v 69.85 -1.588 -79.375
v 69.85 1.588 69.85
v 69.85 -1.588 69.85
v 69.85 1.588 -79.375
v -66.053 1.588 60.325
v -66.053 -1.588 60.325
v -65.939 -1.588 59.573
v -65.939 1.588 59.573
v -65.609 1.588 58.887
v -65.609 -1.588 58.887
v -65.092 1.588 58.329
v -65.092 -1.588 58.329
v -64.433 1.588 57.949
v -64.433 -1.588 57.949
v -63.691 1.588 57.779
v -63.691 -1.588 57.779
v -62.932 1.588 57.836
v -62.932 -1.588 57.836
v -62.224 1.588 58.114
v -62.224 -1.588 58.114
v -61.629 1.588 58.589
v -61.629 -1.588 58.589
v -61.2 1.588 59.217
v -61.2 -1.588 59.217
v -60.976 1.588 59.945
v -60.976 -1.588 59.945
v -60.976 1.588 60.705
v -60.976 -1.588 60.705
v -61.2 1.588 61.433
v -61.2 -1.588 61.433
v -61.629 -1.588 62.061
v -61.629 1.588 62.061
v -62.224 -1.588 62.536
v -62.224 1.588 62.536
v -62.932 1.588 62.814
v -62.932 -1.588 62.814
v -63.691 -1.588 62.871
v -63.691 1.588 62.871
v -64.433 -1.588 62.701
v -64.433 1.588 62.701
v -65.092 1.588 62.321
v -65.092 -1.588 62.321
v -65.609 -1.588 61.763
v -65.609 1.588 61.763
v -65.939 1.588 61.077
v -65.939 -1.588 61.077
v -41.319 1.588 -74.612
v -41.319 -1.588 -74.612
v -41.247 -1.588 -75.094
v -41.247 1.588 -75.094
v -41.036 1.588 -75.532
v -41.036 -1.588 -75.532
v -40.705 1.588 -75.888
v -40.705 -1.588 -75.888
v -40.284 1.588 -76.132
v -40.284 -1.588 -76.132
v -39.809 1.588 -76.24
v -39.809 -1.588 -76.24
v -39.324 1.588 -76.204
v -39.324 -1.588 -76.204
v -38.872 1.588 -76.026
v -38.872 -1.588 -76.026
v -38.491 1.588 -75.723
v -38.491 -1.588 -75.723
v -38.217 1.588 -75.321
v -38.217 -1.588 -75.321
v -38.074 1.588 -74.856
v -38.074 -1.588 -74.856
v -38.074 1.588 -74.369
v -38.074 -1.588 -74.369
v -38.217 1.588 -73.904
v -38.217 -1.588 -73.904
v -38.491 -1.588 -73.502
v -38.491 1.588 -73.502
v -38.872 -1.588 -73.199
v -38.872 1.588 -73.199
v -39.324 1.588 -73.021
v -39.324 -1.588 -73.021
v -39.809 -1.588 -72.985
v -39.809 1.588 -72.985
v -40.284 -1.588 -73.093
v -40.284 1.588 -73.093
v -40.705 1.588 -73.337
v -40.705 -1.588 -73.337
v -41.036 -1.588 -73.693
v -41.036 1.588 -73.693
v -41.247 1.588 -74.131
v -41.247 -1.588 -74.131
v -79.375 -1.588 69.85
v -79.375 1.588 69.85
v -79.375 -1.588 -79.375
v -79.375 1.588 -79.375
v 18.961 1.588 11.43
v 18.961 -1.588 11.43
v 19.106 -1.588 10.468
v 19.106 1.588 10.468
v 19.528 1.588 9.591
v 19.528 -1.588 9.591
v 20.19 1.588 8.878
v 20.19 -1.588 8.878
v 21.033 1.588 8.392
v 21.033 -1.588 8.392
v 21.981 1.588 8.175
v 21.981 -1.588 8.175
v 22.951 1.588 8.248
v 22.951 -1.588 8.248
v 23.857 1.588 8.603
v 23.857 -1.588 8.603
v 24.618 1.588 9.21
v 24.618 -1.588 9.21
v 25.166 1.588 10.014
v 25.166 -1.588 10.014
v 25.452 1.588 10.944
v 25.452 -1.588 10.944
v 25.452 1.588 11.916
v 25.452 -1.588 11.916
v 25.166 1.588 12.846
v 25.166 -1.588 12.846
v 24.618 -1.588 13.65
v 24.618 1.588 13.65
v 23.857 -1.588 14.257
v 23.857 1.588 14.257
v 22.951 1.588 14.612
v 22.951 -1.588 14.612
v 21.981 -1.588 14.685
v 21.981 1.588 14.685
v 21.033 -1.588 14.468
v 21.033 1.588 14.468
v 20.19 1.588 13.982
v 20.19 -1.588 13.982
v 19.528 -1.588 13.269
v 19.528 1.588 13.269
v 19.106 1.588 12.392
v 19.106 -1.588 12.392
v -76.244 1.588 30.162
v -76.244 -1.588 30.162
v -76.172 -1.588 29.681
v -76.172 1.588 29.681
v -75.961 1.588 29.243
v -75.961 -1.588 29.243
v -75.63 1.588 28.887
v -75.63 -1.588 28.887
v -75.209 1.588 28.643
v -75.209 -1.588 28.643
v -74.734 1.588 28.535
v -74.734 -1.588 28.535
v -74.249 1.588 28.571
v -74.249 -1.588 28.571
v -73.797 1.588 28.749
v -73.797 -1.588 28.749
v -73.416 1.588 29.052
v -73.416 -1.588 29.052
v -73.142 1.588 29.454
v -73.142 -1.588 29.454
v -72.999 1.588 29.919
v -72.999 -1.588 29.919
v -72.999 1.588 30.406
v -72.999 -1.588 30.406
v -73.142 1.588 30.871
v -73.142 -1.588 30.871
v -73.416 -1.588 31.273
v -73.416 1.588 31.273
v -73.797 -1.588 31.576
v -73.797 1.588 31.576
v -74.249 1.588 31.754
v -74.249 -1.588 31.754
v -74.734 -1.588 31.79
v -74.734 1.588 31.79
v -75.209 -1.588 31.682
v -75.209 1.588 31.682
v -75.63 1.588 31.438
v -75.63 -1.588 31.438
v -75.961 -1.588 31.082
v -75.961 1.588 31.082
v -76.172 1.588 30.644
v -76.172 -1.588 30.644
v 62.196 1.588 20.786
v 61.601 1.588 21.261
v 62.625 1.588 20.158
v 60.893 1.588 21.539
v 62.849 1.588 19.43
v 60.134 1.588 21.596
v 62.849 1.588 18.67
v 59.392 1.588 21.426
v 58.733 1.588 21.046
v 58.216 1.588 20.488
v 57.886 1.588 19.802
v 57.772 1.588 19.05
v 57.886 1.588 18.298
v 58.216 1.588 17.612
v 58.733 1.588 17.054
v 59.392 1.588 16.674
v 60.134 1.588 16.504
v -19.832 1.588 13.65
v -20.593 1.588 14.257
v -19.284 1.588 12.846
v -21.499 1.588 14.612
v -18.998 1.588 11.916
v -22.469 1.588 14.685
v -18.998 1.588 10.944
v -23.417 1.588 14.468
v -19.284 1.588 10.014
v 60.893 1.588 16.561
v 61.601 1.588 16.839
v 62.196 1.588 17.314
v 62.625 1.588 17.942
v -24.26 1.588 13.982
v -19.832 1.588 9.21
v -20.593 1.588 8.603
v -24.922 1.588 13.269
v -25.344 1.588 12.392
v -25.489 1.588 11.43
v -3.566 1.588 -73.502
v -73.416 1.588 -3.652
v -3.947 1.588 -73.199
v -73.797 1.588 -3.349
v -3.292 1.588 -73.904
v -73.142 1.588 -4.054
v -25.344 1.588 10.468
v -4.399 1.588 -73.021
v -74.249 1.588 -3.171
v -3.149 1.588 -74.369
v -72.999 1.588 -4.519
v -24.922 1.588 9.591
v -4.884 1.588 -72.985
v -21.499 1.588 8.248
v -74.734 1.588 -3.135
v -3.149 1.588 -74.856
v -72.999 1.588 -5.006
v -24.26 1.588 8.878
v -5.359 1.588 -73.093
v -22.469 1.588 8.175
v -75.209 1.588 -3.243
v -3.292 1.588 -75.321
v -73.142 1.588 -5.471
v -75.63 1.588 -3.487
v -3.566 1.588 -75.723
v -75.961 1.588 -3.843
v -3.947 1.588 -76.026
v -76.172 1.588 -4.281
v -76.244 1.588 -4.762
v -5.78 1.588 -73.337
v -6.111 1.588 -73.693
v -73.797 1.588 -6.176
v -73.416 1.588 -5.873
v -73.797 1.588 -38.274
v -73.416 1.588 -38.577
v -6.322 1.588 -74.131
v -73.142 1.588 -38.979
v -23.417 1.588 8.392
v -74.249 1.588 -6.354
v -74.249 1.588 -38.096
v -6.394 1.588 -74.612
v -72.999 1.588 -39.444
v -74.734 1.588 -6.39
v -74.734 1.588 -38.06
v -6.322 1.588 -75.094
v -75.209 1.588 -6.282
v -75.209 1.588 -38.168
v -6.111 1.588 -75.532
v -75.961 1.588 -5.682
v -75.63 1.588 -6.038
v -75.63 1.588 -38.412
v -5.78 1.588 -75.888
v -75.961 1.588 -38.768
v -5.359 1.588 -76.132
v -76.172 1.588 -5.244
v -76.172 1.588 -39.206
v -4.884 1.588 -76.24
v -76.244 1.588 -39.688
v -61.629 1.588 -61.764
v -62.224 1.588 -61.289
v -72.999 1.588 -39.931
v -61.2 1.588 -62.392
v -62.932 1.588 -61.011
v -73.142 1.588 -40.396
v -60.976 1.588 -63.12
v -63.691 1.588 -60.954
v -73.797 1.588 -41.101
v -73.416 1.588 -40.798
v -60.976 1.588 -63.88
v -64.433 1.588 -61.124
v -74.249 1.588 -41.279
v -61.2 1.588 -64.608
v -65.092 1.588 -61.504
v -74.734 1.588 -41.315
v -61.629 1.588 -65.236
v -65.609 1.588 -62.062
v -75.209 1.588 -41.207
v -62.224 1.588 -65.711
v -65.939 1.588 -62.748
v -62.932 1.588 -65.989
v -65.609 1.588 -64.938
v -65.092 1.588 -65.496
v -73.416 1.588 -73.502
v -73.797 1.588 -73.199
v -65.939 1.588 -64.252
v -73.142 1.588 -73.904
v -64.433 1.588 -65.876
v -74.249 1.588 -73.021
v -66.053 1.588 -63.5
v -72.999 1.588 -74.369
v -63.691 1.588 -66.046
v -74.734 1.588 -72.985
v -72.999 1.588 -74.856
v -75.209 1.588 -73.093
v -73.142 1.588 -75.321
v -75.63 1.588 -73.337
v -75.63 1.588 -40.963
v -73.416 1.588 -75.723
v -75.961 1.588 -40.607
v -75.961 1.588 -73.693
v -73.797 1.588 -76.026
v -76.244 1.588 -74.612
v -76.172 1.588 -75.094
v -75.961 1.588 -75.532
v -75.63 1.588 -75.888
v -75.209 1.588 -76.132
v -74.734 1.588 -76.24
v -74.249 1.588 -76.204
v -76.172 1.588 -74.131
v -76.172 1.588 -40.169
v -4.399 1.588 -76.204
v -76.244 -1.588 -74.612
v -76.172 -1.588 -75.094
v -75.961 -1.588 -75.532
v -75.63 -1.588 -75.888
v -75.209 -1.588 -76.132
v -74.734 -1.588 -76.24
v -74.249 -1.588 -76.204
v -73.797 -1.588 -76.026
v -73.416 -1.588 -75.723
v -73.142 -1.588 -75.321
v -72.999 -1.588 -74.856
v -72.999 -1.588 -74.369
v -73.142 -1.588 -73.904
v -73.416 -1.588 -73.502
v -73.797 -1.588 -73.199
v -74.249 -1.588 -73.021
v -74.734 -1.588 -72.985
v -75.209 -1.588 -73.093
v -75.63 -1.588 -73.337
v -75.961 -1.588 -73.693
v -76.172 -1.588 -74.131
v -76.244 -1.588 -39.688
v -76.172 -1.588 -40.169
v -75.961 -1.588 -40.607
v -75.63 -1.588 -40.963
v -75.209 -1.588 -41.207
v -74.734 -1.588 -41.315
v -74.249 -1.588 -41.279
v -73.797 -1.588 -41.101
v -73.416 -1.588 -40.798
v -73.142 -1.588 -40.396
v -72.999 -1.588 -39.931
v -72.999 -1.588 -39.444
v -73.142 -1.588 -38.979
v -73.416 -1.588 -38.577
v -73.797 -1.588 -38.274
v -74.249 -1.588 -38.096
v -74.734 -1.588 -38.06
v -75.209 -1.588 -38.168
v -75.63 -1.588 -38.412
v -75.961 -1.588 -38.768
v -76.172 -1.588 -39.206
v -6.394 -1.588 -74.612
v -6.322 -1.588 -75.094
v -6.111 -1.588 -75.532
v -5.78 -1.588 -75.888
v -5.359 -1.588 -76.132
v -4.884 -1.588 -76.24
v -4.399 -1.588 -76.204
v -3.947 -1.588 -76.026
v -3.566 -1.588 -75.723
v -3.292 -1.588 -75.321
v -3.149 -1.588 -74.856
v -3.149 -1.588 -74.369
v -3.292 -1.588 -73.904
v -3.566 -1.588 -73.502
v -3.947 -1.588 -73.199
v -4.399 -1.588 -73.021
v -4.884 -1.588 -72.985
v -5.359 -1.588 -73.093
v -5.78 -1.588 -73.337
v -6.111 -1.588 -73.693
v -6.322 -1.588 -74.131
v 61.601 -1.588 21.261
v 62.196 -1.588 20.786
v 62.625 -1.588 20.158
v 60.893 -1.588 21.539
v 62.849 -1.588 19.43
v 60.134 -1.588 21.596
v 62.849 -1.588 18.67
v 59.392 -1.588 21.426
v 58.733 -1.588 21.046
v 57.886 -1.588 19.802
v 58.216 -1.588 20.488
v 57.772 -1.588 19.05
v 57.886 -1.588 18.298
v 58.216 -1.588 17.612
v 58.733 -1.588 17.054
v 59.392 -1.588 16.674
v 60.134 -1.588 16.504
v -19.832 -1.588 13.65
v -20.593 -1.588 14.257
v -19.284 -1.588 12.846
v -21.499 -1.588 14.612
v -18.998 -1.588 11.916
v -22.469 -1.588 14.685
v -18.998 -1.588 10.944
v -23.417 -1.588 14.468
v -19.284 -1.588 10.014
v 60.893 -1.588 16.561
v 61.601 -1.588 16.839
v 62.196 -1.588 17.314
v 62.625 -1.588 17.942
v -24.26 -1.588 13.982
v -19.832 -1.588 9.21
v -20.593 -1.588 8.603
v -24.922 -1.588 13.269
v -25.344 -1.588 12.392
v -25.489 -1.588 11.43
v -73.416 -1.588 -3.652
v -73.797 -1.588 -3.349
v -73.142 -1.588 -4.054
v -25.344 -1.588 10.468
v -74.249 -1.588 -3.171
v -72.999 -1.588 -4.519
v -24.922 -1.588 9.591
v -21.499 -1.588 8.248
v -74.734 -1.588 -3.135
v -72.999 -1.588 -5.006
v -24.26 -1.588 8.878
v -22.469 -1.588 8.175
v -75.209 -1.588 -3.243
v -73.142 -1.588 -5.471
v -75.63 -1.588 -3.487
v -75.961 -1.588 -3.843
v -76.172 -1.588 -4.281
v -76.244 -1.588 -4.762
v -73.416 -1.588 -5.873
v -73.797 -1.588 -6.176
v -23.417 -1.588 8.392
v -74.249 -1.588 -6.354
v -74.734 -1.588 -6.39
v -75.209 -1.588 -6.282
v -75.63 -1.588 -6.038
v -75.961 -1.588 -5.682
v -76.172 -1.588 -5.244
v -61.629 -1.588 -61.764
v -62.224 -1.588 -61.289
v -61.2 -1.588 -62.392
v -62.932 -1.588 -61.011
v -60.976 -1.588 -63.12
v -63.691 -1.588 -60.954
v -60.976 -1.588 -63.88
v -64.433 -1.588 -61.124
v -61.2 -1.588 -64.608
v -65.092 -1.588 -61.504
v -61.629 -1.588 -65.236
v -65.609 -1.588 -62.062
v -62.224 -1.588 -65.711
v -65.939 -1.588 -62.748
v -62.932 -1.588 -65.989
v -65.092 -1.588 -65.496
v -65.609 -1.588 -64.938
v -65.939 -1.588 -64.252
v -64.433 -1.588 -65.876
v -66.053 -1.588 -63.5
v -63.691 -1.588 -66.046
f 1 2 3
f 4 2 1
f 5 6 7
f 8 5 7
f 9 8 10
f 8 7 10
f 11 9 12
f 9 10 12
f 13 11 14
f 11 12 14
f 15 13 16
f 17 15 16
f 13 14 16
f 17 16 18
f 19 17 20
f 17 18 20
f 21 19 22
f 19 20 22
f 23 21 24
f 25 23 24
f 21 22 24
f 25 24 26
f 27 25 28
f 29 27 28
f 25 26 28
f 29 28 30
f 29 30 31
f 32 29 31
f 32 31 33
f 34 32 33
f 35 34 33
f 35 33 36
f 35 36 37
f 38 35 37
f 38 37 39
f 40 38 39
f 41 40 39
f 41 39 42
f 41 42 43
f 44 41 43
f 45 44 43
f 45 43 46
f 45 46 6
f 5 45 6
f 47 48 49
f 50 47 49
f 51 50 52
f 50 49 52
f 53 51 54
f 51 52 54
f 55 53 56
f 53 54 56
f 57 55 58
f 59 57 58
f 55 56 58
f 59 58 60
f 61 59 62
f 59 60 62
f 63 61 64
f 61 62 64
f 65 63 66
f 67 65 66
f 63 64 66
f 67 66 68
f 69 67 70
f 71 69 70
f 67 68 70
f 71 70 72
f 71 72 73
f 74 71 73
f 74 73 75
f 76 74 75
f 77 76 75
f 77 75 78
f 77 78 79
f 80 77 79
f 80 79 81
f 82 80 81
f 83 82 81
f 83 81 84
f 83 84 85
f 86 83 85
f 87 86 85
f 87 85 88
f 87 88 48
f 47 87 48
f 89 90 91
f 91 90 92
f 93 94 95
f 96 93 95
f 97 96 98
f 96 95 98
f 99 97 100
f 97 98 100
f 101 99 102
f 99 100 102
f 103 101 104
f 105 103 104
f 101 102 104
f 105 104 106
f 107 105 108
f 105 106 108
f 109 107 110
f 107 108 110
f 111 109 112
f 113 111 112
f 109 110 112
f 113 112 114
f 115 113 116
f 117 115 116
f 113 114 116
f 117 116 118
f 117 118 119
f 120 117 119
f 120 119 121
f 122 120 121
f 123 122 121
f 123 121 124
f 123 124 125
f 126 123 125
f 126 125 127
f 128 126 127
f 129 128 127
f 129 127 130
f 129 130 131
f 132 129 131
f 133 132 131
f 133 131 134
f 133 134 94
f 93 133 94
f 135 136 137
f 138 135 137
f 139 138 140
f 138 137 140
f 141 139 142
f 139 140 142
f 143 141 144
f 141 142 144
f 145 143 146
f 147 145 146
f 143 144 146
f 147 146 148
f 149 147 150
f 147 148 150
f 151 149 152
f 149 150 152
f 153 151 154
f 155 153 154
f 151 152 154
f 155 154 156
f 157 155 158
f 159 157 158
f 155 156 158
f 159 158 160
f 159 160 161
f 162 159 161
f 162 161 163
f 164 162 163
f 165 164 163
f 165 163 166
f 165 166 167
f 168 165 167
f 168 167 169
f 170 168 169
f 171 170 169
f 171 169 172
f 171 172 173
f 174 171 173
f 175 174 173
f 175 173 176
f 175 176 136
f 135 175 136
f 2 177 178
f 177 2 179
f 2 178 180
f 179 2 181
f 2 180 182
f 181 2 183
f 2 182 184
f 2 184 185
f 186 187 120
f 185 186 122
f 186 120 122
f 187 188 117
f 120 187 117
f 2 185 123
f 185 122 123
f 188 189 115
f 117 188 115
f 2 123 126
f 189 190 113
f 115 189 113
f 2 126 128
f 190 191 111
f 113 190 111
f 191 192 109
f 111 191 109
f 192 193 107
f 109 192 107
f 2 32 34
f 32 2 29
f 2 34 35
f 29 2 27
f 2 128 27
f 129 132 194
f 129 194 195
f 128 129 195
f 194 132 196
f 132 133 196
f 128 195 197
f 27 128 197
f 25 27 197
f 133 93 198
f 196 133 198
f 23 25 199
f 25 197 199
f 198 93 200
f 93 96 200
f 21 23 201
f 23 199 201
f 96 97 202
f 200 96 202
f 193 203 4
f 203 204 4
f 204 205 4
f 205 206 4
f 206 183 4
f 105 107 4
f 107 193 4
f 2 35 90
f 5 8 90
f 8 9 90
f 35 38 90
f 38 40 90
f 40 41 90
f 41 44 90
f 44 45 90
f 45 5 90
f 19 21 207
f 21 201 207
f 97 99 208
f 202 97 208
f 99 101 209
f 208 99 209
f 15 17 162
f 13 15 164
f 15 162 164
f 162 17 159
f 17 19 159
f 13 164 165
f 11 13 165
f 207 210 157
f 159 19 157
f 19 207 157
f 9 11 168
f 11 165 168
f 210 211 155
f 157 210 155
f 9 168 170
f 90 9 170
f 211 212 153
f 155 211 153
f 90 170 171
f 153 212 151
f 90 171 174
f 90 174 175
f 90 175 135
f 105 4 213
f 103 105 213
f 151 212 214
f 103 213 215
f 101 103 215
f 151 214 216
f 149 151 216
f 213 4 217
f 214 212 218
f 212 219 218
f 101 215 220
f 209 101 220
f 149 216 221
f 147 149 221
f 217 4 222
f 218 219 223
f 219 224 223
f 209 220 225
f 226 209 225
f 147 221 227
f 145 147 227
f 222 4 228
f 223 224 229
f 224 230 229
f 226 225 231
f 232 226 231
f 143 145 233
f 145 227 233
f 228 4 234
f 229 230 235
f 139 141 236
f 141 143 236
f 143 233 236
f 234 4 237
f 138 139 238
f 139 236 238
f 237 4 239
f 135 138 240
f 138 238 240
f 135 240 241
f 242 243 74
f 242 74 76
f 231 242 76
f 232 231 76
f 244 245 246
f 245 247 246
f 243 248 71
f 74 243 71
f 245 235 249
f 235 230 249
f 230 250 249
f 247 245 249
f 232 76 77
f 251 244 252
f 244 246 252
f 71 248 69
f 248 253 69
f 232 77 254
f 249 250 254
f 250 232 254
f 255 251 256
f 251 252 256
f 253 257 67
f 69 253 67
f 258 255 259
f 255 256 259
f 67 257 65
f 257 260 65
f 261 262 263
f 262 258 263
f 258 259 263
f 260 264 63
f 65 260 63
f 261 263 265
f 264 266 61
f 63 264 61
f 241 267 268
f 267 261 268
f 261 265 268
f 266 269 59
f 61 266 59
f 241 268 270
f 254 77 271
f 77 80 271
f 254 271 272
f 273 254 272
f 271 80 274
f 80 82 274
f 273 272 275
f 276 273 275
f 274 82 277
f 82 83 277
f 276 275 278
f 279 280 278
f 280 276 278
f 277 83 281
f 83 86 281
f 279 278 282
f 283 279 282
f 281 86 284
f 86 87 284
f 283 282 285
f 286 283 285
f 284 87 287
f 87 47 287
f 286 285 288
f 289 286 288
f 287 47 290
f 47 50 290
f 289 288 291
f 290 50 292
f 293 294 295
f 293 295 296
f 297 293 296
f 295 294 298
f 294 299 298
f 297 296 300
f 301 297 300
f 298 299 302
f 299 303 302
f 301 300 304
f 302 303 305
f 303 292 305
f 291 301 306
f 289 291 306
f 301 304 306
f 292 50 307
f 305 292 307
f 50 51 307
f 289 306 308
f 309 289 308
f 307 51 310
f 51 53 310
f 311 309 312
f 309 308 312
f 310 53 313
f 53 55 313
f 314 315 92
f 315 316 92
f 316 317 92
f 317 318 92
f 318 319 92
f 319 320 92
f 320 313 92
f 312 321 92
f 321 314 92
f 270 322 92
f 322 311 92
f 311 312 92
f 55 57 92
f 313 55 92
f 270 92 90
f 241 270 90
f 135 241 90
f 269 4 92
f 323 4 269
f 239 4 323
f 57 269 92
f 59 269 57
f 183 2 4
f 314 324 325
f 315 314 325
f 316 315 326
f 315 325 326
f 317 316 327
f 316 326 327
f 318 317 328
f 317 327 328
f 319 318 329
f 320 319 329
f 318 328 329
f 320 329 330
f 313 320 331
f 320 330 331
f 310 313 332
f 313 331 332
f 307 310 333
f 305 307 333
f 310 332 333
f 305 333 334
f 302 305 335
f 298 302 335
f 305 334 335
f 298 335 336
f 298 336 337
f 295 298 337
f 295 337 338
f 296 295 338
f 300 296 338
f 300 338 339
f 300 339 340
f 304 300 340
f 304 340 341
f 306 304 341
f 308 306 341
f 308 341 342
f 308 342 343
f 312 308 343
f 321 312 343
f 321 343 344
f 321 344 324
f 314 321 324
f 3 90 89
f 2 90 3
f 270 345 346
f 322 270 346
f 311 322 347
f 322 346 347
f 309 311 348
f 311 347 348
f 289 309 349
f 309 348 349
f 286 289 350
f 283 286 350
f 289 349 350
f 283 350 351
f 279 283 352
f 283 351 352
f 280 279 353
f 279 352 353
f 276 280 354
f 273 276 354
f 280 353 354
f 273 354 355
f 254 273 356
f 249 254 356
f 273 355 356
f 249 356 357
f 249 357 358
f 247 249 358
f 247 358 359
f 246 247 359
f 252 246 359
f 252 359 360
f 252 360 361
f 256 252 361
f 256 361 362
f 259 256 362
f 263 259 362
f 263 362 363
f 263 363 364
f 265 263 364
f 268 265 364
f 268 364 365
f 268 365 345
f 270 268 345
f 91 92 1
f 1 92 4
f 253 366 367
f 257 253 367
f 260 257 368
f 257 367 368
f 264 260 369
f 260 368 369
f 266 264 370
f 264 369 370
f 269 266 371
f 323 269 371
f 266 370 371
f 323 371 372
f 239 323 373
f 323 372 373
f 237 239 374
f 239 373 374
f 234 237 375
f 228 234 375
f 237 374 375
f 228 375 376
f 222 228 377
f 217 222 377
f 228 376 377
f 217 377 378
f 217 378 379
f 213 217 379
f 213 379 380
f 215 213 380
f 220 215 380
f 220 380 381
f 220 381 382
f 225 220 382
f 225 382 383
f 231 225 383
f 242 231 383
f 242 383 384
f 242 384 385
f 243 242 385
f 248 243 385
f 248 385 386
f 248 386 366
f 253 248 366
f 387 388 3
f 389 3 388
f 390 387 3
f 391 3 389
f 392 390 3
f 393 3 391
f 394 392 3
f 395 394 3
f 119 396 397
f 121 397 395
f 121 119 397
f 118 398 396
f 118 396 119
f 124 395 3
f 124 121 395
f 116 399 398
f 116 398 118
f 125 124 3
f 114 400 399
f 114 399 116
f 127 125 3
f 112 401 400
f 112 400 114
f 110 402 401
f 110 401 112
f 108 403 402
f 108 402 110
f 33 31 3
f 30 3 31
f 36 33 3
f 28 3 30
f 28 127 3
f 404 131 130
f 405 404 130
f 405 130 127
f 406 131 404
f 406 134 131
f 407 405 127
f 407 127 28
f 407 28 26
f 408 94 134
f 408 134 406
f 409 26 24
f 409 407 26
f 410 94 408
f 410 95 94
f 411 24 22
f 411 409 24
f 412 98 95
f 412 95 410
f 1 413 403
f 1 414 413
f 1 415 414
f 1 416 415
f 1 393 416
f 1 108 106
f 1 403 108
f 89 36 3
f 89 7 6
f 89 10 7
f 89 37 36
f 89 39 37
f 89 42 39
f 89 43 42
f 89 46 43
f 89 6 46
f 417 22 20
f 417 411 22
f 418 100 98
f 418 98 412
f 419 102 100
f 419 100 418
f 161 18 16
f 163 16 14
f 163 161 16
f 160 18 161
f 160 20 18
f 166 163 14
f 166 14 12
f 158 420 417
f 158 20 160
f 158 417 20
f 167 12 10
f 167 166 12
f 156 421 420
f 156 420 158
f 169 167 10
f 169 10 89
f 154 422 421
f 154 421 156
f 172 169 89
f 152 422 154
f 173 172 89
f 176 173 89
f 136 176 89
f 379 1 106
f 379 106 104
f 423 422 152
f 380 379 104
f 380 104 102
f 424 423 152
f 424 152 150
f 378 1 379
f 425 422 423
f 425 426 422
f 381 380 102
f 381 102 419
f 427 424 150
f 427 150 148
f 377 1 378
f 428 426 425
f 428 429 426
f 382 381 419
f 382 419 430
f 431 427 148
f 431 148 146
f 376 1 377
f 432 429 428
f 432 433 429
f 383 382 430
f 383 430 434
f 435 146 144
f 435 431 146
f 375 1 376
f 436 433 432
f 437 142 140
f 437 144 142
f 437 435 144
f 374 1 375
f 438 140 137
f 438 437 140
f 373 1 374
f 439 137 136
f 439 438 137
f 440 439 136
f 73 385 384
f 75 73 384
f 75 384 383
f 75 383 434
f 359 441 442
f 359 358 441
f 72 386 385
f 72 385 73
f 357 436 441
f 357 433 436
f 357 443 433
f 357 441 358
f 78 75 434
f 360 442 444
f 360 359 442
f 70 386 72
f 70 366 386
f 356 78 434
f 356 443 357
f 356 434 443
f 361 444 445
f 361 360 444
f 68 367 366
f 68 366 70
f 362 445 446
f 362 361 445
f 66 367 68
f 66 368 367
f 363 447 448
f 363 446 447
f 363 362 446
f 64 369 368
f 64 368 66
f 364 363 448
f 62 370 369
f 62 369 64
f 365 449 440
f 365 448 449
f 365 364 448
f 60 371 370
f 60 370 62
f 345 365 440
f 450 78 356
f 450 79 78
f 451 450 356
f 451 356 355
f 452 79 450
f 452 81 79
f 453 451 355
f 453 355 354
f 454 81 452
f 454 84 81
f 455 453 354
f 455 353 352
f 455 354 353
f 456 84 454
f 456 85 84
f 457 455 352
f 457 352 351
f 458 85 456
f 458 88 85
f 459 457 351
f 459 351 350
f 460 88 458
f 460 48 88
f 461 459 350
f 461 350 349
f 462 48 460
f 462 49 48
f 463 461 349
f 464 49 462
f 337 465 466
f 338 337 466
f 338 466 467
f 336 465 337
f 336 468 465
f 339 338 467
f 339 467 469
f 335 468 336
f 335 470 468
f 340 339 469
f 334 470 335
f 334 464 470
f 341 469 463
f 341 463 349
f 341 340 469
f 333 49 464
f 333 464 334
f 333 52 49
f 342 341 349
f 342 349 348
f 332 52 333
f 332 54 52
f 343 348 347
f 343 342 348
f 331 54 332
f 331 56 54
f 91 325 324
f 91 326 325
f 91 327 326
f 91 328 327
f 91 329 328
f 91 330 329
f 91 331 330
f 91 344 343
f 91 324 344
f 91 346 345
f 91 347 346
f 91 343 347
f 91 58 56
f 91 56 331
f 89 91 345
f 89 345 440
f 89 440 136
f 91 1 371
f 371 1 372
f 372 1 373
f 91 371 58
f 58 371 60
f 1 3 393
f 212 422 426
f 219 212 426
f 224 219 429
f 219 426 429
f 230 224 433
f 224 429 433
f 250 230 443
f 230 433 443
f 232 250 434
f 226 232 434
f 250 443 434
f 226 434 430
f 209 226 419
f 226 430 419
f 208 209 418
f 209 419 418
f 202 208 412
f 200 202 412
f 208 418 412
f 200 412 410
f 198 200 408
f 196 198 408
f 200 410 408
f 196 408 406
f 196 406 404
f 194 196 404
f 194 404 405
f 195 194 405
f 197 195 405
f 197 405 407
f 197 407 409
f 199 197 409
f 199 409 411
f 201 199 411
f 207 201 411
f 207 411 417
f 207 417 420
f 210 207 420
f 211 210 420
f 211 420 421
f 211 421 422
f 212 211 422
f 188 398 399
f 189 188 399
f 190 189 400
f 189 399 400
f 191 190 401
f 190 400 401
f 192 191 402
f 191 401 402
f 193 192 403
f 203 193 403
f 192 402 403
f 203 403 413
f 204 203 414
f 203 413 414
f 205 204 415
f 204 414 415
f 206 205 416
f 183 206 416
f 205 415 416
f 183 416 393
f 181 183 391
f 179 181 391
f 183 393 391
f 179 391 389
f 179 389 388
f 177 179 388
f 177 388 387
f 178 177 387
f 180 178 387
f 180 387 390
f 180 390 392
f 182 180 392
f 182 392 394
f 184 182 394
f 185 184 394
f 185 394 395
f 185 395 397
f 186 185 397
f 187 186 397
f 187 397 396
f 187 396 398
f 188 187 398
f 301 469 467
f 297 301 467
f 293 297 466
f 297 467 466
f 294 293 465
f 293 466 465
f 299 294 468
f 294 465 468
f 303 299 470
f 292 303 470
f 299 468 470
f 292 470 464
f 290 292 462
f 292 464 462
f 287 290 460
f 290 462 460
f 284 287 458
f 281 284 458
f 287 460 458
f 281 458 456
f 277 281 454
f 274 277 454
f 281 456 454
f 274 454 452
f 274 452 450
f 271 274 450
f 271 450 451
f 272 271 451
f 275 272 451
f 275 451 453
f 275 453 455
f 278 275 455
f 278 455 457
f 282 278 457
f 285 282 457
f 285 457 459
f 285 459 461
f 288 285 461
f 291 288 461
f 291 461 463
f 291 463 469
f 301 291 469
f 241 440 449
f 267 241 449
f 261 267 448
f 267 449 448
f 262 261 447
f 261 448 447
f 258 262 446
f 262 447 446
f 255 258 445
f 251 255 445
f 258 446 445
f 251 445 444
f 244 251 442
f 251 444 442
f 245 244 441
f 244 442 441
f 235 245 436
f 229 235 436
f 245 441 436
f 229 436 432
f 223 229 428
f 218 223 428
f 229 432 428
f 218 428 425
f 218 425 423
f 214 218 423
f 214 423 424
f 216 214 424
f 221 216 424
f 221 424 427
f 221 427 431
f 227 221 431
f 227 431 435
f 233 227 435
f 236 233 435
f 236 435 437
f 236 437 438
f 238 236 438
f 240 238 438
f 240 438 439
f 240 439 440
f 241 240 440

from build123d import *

# Parameters (mm, degrees)
BOSS_EXTRUDE1_DEPTH     = 1.5875
F_4_CLEARANCE_HOLE1_D   = 3.2639
F_10_CLEARANCE_HOLE1_D  = 5.1054
F_1_4_CLEARANCE_HOLE1_D = 6.5278


with BuildPart() as part:
    # Sketch1 → Boss-Extrude1 (new, symmetric)
    with BuildSketch(Plane(origin=(0, 0, 0), x_dir=(1, 0, 0), z_dir=(0, 1, 0))):
        Polygon((-69.85, -69.85), (-79.375, -69.85), (-79.375, 79.375), (69.85, 79.375), (69.85, 69.85), (69.85, -69.85), align=None)
    extrude(amount=BOSS_EXTRUDE1_DEPTH, both=True)

    # #4 Clearance Hole1 (through all)
    with Locations(Plane(origin=(0, 1.5875, 0), x_dir=(1, 0, 0), z_dir=(0, 1, 0))):
        with Locations((-74.6125, 4.7625), (-74.6125, 39.6875), (-74.6125, 74.6125), (-39.6875, 74.6125), (-4.7625, 74.6125), (-74.6125, -30.1625)):
            Hole(F_4_CLEARANCE_HOLE1_D / 2)

    # #10 Clearance Hole1 (through all)
    with Locations(Plane(origin=(0, 1.5875, 0), x_dir=(1, 0, 0), z_dir=(0, 1, 0))):
        with Locations((-63.5, -60.325), (-63.5, 63.5), (60.325, -19.05), (-22.225, -11.43), (22.225, -11.43)):
            Hole(F_10_CLEARANCE_HOLE1_D / 2)

    # 1/4 Clearance Hole1 (through all)
    with Locations(Plane(origin=(0, 1.5875, 0), x_dir=(1, 0, 0), z_dir=(0, 1, 0))):
        with Locations((-22.225, -11.43), (22.225, -11.43)):
            Hole(F_1_4_CLEARANCE_HOLE1_D / 2)


solid = part.part
